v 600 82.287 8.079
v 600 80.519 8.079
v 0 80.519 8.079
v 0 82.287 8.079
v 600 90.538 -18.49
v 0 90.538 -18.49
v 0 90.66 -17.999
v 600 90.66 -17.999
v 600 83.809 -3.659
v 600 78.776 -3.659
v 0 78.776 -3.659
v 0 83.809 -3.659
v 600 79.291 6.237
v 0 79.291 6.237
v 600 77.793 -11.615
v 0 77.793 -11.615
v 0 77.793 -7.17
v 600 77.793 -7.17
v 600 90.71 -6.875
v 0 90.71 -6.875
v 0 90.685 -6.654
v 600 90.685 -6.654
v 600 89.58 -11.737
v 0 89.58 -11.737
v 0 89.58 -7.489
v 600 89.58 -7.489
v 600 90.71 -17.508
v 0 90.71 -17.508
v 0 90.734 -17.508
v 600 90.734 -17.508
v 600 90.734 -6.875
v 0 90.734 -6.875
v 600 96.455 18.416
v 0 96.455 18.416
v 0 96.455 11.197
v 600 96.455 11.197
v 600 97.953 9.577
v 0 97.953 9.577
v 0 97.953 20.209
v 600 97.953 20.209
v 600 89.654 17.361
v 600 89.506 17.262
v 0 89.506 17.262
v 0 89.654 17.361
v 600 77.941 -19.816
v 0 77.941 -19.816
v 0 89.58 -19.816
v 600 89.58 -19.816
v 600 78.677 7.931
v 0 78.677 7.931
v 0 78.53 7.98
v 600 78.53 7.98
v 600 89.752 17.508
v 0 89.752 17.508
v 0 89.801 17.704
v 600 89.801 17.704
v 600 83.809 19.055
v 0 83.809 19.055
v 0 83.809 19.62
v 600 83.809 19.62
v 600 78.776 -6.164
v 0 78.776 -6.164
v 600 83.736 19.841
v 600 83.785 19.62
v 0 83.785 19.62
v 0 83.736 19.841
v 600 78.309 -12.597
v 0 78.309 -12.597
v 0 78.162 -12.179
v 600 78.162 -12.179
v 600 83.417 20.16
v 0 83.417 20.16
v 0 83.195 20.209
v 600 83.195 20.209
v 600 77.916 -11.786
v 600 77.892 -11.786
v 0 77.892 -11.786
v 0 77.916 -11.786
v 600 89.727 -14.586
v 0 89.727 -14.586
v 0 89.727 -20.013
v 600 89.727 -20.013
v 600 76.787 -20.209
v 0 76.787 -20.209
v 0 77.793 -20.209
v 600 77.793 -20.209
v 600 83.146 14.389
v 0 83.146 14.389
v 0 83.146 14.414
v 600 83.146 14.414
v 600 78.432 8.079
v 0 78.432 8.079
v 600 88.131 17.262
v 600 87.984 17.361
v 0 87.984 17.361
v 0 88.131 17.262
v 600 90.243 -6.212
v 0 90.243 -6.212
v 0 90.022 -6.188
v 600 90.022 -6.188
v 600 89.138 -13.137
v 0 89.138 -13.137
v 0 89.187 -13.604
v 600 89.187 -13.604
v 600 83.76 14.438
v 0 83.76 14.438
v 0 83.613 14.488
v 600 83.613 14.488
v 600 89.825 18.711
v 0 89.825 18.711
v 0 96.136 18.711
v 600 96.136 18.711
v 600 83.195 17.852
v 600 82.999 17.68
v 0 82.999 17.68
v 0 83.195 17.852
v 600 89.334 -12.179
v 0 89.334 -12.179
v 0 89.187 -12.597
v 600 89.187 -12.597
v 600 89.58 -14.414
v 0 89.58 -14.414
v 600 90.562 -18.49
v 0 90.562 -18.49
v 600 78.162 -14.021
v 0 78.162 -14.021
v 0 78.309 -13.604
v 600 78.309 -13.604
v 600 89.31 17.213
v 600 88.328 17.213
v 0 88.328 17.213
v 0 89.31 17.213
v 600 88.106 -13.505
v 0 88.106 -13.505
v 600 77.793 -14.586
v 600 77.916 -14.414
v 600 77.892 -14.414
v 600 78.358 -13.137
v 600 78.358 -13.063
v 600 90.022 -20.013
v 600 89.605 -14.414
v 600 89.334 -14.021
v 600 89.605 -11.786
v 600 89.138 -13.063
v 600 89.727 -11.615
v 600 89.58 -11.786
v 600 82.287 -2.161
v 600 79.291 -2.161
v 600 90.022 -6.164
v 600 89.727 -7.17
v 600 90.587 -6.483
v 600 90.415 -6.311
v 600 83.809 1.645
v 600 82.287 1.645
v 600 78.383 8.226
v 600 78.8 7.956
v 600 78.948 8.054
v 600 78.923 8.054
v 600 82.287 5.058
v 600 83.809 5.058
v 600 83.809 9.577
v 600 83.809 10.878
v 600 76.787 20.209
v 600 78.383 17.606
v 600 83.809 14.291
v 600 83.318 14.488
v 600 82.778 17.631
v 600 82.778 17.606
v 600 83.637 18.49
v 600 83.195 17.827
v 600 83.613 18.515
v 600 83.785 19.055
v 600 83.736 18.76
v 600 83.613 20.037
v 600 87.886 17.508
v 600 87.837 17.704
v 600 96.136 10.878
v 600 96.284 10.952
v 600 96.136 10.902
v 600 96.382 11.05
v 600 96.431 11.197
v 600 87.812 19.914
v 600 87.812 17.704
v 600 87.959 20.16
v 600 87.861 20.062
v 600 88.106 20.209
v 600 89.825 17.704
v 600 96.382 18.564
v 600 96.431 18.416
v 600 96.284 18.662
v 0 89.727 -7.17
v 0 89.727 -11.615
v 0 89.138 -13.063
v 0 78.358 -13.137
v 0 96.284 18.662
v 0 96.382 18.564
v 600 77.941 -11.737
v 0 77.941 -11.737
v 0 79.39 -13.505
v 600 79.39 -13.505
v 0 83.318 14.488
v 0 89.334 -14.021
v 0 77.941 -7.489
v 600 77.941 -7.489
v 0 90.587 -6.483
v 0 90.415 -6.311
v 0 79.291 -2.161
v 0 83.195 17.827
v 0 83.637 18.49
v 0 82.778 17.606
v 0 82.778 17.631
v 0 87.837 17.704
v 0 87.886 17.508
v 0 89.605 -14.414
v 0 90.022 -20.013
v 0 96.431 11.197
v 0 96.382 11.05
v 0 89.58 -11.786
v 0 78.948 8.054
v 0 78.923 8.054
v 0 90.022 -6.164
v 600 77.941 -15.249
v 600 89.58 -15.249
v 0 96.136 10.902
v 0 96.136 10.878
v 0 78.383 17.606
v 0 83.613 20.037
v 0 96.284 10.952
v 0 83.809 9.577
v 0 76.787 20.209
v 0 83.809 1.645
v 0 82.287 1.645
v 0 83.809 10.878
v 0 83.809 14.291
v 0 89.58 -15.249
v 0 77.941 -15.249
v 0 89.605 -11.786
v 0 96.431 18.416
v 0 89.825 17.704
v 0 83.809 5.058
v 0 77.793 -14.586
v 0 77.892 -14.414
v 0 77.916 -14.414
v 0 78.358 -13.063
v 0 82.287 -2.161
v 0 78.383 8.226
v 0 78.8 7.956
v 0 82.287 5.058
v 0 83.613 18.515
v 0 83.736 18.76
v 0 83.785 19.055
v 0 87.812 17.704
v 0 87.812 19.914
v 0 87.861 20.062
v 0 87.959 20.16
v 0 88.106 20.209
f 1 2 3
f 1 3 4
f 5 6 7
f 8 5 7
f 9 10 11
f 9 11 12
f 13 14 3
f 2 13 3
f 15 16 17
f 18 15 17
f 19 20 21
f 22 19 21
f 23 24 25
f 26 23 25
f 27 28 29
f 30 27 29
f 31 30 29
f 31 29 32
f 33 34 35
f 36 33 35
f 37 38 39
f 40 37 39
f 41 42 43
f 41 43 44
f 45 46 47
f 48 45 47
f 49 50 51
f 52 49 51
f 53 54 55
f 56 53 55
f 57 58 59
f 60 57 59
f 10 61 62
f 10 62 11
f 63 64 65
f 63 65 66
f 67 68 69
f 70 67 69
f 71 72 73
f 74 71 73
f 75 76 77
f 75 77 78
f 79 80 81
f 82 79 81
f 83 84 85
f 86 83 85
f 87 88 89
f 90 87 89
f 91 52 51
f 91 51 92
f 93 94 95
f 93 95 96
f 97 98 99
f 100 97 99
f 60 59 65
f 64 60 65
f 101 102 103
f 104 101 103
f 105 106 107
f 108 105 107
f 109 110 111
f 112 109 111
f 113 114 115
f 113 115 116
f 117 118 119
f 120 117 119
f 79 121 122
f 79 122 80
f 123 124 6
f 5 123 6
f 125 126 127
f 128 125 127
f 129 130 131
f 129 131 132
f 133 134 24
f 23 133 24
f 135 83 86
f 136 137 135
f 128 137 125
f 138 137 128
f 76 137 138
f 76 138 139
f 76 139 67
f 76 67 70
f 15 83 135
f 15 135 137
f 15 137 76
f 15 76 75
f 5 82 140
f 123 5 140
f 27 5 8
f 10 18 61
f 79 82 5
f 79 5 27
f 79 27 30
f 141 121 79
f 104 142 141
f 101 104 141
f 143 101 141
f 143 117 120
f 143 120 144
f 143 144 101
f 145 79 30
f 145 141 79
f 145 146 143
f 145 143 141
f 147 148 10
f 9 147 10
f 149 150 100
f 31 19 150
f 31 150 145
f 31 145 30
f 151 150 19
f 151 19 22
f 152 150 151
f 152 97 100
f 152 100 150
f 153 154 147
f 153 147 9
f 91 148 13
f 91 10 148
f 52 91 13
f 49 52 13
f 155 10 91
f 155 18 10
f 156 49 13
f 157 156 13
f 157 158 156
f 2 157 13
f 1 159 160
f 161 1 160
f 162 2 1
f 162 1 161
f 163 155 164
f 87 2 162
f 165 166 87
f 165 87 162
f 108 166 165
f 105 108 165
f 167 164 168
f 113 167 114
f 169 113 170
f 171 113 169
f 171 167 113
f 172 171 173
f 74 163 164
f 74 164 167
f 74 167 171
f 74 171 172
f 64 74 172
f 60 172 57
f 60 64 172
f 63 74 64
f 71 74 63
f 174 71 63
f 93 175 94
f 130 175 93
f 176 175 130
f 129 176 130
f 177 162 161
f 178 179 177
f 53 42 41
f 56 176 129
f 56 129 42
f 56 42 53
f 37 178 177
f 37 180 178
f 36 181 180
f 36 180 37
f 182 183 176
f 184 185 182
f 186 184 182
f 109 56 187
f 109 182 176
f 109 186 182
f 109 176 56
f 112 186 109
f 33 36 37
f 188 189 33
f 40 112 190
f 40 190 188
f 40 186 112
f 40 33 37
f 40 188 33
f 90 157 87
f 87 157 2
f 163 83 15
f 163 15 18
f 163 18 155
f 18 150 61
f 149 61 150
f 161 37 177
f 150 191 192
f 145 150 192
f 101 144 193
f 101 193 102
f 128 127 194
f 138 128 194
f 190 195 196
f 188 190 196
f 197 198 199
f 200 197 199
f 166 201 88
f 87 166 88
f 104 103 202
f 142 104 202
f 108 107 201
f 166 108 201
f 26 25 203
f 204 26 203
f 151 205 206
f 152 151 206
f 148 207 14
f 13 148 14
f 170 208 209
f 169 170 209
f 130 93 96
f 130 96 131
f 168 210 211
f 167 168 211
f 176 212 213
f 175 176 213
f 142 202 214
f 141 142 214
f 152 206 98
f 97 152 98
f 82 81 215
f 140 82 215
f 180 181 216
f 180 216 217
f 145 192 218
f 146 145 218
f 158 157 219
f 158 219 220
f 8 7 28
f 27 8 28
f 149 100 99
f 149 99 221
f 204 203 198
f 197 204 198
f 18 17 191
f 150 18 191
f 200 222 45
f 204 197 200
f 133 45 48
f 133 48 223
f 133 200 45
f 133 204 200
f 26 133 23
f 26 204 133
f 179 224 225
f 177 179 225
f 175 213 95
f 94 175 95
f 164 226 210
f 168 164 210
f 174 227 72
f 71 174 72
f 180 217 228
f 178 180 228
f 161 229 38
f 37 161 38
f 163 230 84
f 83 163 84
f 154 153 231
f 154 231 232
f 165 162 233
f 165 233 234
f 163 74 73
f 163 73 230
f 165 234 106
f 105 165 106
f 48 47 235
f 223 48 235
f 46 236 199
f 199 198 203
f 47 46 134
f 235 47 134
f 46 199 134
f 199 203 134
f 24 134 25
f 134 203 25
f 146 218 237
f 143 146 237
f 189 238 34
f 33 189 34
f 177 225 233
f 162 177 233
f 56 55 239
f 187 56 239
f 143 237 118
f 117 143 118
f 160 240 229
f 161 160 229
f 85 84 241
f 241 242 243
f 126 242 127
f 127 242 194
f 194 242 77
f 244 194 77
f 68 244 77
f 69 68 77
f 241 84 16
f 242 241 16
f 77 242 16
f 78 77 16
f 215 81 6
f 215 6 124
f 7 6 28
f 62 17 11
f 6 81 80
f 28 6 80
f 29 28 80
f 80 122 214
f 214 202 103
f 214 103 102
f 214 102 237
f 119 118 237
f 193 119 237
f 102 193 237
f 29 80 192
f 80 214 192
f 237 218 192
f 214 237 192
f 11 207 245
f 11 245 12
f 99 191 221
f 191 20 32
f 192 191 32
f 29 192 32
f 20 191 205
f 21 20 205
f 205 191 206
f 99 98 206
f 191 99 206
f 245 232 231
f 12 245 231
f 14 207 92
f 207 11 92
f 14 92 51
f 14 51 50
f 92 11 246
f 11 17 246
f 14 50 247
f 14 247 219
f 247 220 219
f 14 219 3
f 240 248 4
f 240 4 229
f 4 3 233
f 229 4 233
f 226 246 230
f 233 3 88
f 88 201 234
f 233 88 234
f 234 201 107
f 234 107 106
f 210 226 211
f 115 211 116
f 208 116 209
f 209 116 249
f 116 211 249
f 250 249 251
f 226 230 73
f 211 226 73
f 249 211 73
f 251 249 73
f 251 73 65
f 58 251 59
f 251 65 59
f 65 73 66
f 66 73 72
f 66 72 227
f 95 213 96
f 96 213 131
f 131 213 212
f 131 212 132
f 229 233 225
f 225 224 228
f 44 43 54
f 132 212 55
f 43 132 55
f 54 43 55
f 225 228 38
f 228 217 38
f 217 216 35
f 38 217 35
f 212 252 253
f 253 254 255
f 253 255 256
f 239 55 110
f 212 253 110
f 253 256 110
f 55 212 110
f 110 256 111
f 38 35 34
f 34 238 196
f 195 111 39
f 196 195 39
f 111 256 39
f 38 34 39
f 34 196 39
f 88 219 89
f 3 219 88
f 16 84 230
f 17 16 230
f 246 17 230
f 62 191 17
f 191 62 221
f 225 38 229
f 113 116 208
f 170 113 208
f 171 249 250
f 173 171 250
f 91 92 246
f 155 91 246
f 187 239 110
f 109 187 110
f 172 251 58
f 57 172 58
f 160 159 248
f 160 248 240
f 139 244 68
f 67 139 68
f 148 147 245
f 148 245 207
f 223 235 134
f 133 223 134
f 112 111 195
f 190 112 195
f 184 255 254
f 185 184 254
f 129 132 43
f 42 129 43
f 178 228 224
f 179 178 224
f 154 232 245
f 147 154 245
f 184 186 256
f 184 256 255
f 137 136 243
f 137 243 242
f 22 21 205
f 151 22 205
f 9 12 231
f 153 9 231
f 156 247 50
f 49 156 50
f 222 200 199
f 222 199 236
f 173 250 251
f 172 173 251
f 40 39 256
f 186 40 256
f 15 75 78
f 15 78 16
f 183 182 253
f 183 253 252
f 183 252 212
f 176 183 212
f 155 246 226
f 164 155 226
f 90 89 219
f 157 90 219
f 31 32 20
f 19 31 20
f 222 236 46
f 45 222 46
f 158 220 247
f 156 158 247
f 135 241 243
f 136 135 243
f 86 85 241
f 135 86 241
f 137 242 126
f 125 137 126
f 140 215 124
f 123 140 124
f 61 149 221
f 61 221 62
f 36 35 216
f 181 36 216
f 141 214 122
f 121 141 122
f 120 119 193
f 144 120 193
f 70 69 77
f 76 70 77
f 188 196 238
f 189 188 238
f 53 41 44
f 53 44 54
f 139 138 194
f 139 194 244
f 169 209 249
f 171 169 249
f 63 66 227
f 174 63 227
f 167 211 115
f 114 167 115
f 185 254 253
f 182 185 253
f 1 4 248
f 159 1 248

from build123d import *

# Parameters (mm, degrees)
F1_DEPTH = 600


with BuildPart() as f1:
    # F0 (on Right) → F1 (new body)
    with BuildSketch(Plane.YZ):
        Polygon((97.953237, 9.576591), (97.953237, 20.209017), (88.106465, 20.209017), (87.959187, 20.159924), (87.860829, 20.061739), (87.811737, 19.914461), (87.811737, 17.704432), (87.836541, 17.704432), (87.885806, 17.507717), (87.983819, 17.360612), (88.131269, 17.262254), (88.32764, 17.213162), (89.309664, 17.213162), (89.506207, 17.262254), (89.653657, 17.360612), (89.751842, 17.507717), (89.800935, 17.704432), (89.825395, 17.704432), (89.825395, 18.711261), (96.136121, 18.711261), (96.283571, 18.661997), (96.381584, 18.563811), (96.430677, 18.416361), (96.455309, 18.416361), (96.455309, 11.197164), (96.430677, 11.197164), (96.381584, 11.049886), (96.283571, 10.951701), (96.136121, 10.902263), (96.136121, 10.877976), (83.809397, 10.877976), (83.809397, 14.291204), (83.760132, 14.438482), (83.613027, 14.487747), (83.318299, 14.487747), (83.146388, 14.389389), (83.146388, 14.414022), (78.947506, 8.054203), (78.922874, 8.054203), (78.800056, 7.955846), (78.677238, 7.931385), (78.529961, 7.980478), (78.431775, 8.078663), (78.382683, 8.226113), (78.382683, 17.606075), (82.778108, 17.606075), (82.778108, 17.630707), (82.999283, 17.6798), (83.195481, 17.85171), (83.195481, 17.827078), (83.637487, 18.490086), (83.613027, 18.514719), (83.735672, 18.760354), (83.784937, 19.05491), (83.809397, 19.05491), (83.809397, 19.619733), (83.784937, 19.619733), (83.735672, 19.840736), (83.613027, 20.037279), (83.416656, 20.159924), (83.195481, 20.209017), (76.78657, 20.209017), (76.78657, -20.209016), (77.793399, -20.209016), (77.793399, -14.585931), (77.916045, -14.414021), (77.891584, -14.414021), (78.16168, -14.021108), (78.308958, -13.603562), (78.358223, -13.136924), (78.358223, -13.063371), (78.308958, -12.596733), (78.16168, -12.17936), (77.891584, -11.786274), (77.916045, -11.786274), (77.793399, -11.614708), (77.793399, -7.170018), (89.727382, -7.170018), (89.727382, -11.614708), (89.57976, -11.786274), (89.604564, -11.786274), (89.334469, -12.17936), (89.187019, -12.596733), (89.137926, -13.063371), (89.137926, -13.136924), (89.187019, -13.603562), (89.334469, -14.021108), (89.604564, -14.414021), (89.57976, -14.414021), (89.727382, -14.585931), (89.727382, -20.012645), (90.02211, -20.012645), (90.562129, -18.490085), (90.537669, -18.490085), (90.660314, -17.998987), (90.709579, -17.508061), (90.733867, -17.508061), (90.733867, -6.875291), (90.709579, -6.875291), (90.684774, -6.65446), (90.586589, -6.48255), (90.414851, -6.310639), (90.242768, -6.212454), (90.02211, -6.187994), (90.02211, -6.163534), (78.775596, -6.163534), (78.775596, -3.658949), (83.809397, -3.658949), (83.809397, 1.64512), (82.286837, 1.64512), (82.286837, -2.160677), (79.291327, -2.160677), (79.291327, 6.237087), (80.518986, 8.078663), (81.402912, 8.078663), (82.286837, 8.078663), (82.286837, 5.058348), (83.809397, 5.058348), (83.809397, 9.576591), align=None)
        Polygon((77.940505, -7.489207), (77.940505, -11.737354), (79.389512, -13.505377), (77.940505, -15.24894), (77.940505, -19.816103), (89.57976, -19.816103), (89.57976, -15.24894), (88.106465, -13.505377), (89.57976, -11.737354), (89.57976, -7.489207), align=None)
    extrude(amount=F1_DEPTH)


solid = f1.part
